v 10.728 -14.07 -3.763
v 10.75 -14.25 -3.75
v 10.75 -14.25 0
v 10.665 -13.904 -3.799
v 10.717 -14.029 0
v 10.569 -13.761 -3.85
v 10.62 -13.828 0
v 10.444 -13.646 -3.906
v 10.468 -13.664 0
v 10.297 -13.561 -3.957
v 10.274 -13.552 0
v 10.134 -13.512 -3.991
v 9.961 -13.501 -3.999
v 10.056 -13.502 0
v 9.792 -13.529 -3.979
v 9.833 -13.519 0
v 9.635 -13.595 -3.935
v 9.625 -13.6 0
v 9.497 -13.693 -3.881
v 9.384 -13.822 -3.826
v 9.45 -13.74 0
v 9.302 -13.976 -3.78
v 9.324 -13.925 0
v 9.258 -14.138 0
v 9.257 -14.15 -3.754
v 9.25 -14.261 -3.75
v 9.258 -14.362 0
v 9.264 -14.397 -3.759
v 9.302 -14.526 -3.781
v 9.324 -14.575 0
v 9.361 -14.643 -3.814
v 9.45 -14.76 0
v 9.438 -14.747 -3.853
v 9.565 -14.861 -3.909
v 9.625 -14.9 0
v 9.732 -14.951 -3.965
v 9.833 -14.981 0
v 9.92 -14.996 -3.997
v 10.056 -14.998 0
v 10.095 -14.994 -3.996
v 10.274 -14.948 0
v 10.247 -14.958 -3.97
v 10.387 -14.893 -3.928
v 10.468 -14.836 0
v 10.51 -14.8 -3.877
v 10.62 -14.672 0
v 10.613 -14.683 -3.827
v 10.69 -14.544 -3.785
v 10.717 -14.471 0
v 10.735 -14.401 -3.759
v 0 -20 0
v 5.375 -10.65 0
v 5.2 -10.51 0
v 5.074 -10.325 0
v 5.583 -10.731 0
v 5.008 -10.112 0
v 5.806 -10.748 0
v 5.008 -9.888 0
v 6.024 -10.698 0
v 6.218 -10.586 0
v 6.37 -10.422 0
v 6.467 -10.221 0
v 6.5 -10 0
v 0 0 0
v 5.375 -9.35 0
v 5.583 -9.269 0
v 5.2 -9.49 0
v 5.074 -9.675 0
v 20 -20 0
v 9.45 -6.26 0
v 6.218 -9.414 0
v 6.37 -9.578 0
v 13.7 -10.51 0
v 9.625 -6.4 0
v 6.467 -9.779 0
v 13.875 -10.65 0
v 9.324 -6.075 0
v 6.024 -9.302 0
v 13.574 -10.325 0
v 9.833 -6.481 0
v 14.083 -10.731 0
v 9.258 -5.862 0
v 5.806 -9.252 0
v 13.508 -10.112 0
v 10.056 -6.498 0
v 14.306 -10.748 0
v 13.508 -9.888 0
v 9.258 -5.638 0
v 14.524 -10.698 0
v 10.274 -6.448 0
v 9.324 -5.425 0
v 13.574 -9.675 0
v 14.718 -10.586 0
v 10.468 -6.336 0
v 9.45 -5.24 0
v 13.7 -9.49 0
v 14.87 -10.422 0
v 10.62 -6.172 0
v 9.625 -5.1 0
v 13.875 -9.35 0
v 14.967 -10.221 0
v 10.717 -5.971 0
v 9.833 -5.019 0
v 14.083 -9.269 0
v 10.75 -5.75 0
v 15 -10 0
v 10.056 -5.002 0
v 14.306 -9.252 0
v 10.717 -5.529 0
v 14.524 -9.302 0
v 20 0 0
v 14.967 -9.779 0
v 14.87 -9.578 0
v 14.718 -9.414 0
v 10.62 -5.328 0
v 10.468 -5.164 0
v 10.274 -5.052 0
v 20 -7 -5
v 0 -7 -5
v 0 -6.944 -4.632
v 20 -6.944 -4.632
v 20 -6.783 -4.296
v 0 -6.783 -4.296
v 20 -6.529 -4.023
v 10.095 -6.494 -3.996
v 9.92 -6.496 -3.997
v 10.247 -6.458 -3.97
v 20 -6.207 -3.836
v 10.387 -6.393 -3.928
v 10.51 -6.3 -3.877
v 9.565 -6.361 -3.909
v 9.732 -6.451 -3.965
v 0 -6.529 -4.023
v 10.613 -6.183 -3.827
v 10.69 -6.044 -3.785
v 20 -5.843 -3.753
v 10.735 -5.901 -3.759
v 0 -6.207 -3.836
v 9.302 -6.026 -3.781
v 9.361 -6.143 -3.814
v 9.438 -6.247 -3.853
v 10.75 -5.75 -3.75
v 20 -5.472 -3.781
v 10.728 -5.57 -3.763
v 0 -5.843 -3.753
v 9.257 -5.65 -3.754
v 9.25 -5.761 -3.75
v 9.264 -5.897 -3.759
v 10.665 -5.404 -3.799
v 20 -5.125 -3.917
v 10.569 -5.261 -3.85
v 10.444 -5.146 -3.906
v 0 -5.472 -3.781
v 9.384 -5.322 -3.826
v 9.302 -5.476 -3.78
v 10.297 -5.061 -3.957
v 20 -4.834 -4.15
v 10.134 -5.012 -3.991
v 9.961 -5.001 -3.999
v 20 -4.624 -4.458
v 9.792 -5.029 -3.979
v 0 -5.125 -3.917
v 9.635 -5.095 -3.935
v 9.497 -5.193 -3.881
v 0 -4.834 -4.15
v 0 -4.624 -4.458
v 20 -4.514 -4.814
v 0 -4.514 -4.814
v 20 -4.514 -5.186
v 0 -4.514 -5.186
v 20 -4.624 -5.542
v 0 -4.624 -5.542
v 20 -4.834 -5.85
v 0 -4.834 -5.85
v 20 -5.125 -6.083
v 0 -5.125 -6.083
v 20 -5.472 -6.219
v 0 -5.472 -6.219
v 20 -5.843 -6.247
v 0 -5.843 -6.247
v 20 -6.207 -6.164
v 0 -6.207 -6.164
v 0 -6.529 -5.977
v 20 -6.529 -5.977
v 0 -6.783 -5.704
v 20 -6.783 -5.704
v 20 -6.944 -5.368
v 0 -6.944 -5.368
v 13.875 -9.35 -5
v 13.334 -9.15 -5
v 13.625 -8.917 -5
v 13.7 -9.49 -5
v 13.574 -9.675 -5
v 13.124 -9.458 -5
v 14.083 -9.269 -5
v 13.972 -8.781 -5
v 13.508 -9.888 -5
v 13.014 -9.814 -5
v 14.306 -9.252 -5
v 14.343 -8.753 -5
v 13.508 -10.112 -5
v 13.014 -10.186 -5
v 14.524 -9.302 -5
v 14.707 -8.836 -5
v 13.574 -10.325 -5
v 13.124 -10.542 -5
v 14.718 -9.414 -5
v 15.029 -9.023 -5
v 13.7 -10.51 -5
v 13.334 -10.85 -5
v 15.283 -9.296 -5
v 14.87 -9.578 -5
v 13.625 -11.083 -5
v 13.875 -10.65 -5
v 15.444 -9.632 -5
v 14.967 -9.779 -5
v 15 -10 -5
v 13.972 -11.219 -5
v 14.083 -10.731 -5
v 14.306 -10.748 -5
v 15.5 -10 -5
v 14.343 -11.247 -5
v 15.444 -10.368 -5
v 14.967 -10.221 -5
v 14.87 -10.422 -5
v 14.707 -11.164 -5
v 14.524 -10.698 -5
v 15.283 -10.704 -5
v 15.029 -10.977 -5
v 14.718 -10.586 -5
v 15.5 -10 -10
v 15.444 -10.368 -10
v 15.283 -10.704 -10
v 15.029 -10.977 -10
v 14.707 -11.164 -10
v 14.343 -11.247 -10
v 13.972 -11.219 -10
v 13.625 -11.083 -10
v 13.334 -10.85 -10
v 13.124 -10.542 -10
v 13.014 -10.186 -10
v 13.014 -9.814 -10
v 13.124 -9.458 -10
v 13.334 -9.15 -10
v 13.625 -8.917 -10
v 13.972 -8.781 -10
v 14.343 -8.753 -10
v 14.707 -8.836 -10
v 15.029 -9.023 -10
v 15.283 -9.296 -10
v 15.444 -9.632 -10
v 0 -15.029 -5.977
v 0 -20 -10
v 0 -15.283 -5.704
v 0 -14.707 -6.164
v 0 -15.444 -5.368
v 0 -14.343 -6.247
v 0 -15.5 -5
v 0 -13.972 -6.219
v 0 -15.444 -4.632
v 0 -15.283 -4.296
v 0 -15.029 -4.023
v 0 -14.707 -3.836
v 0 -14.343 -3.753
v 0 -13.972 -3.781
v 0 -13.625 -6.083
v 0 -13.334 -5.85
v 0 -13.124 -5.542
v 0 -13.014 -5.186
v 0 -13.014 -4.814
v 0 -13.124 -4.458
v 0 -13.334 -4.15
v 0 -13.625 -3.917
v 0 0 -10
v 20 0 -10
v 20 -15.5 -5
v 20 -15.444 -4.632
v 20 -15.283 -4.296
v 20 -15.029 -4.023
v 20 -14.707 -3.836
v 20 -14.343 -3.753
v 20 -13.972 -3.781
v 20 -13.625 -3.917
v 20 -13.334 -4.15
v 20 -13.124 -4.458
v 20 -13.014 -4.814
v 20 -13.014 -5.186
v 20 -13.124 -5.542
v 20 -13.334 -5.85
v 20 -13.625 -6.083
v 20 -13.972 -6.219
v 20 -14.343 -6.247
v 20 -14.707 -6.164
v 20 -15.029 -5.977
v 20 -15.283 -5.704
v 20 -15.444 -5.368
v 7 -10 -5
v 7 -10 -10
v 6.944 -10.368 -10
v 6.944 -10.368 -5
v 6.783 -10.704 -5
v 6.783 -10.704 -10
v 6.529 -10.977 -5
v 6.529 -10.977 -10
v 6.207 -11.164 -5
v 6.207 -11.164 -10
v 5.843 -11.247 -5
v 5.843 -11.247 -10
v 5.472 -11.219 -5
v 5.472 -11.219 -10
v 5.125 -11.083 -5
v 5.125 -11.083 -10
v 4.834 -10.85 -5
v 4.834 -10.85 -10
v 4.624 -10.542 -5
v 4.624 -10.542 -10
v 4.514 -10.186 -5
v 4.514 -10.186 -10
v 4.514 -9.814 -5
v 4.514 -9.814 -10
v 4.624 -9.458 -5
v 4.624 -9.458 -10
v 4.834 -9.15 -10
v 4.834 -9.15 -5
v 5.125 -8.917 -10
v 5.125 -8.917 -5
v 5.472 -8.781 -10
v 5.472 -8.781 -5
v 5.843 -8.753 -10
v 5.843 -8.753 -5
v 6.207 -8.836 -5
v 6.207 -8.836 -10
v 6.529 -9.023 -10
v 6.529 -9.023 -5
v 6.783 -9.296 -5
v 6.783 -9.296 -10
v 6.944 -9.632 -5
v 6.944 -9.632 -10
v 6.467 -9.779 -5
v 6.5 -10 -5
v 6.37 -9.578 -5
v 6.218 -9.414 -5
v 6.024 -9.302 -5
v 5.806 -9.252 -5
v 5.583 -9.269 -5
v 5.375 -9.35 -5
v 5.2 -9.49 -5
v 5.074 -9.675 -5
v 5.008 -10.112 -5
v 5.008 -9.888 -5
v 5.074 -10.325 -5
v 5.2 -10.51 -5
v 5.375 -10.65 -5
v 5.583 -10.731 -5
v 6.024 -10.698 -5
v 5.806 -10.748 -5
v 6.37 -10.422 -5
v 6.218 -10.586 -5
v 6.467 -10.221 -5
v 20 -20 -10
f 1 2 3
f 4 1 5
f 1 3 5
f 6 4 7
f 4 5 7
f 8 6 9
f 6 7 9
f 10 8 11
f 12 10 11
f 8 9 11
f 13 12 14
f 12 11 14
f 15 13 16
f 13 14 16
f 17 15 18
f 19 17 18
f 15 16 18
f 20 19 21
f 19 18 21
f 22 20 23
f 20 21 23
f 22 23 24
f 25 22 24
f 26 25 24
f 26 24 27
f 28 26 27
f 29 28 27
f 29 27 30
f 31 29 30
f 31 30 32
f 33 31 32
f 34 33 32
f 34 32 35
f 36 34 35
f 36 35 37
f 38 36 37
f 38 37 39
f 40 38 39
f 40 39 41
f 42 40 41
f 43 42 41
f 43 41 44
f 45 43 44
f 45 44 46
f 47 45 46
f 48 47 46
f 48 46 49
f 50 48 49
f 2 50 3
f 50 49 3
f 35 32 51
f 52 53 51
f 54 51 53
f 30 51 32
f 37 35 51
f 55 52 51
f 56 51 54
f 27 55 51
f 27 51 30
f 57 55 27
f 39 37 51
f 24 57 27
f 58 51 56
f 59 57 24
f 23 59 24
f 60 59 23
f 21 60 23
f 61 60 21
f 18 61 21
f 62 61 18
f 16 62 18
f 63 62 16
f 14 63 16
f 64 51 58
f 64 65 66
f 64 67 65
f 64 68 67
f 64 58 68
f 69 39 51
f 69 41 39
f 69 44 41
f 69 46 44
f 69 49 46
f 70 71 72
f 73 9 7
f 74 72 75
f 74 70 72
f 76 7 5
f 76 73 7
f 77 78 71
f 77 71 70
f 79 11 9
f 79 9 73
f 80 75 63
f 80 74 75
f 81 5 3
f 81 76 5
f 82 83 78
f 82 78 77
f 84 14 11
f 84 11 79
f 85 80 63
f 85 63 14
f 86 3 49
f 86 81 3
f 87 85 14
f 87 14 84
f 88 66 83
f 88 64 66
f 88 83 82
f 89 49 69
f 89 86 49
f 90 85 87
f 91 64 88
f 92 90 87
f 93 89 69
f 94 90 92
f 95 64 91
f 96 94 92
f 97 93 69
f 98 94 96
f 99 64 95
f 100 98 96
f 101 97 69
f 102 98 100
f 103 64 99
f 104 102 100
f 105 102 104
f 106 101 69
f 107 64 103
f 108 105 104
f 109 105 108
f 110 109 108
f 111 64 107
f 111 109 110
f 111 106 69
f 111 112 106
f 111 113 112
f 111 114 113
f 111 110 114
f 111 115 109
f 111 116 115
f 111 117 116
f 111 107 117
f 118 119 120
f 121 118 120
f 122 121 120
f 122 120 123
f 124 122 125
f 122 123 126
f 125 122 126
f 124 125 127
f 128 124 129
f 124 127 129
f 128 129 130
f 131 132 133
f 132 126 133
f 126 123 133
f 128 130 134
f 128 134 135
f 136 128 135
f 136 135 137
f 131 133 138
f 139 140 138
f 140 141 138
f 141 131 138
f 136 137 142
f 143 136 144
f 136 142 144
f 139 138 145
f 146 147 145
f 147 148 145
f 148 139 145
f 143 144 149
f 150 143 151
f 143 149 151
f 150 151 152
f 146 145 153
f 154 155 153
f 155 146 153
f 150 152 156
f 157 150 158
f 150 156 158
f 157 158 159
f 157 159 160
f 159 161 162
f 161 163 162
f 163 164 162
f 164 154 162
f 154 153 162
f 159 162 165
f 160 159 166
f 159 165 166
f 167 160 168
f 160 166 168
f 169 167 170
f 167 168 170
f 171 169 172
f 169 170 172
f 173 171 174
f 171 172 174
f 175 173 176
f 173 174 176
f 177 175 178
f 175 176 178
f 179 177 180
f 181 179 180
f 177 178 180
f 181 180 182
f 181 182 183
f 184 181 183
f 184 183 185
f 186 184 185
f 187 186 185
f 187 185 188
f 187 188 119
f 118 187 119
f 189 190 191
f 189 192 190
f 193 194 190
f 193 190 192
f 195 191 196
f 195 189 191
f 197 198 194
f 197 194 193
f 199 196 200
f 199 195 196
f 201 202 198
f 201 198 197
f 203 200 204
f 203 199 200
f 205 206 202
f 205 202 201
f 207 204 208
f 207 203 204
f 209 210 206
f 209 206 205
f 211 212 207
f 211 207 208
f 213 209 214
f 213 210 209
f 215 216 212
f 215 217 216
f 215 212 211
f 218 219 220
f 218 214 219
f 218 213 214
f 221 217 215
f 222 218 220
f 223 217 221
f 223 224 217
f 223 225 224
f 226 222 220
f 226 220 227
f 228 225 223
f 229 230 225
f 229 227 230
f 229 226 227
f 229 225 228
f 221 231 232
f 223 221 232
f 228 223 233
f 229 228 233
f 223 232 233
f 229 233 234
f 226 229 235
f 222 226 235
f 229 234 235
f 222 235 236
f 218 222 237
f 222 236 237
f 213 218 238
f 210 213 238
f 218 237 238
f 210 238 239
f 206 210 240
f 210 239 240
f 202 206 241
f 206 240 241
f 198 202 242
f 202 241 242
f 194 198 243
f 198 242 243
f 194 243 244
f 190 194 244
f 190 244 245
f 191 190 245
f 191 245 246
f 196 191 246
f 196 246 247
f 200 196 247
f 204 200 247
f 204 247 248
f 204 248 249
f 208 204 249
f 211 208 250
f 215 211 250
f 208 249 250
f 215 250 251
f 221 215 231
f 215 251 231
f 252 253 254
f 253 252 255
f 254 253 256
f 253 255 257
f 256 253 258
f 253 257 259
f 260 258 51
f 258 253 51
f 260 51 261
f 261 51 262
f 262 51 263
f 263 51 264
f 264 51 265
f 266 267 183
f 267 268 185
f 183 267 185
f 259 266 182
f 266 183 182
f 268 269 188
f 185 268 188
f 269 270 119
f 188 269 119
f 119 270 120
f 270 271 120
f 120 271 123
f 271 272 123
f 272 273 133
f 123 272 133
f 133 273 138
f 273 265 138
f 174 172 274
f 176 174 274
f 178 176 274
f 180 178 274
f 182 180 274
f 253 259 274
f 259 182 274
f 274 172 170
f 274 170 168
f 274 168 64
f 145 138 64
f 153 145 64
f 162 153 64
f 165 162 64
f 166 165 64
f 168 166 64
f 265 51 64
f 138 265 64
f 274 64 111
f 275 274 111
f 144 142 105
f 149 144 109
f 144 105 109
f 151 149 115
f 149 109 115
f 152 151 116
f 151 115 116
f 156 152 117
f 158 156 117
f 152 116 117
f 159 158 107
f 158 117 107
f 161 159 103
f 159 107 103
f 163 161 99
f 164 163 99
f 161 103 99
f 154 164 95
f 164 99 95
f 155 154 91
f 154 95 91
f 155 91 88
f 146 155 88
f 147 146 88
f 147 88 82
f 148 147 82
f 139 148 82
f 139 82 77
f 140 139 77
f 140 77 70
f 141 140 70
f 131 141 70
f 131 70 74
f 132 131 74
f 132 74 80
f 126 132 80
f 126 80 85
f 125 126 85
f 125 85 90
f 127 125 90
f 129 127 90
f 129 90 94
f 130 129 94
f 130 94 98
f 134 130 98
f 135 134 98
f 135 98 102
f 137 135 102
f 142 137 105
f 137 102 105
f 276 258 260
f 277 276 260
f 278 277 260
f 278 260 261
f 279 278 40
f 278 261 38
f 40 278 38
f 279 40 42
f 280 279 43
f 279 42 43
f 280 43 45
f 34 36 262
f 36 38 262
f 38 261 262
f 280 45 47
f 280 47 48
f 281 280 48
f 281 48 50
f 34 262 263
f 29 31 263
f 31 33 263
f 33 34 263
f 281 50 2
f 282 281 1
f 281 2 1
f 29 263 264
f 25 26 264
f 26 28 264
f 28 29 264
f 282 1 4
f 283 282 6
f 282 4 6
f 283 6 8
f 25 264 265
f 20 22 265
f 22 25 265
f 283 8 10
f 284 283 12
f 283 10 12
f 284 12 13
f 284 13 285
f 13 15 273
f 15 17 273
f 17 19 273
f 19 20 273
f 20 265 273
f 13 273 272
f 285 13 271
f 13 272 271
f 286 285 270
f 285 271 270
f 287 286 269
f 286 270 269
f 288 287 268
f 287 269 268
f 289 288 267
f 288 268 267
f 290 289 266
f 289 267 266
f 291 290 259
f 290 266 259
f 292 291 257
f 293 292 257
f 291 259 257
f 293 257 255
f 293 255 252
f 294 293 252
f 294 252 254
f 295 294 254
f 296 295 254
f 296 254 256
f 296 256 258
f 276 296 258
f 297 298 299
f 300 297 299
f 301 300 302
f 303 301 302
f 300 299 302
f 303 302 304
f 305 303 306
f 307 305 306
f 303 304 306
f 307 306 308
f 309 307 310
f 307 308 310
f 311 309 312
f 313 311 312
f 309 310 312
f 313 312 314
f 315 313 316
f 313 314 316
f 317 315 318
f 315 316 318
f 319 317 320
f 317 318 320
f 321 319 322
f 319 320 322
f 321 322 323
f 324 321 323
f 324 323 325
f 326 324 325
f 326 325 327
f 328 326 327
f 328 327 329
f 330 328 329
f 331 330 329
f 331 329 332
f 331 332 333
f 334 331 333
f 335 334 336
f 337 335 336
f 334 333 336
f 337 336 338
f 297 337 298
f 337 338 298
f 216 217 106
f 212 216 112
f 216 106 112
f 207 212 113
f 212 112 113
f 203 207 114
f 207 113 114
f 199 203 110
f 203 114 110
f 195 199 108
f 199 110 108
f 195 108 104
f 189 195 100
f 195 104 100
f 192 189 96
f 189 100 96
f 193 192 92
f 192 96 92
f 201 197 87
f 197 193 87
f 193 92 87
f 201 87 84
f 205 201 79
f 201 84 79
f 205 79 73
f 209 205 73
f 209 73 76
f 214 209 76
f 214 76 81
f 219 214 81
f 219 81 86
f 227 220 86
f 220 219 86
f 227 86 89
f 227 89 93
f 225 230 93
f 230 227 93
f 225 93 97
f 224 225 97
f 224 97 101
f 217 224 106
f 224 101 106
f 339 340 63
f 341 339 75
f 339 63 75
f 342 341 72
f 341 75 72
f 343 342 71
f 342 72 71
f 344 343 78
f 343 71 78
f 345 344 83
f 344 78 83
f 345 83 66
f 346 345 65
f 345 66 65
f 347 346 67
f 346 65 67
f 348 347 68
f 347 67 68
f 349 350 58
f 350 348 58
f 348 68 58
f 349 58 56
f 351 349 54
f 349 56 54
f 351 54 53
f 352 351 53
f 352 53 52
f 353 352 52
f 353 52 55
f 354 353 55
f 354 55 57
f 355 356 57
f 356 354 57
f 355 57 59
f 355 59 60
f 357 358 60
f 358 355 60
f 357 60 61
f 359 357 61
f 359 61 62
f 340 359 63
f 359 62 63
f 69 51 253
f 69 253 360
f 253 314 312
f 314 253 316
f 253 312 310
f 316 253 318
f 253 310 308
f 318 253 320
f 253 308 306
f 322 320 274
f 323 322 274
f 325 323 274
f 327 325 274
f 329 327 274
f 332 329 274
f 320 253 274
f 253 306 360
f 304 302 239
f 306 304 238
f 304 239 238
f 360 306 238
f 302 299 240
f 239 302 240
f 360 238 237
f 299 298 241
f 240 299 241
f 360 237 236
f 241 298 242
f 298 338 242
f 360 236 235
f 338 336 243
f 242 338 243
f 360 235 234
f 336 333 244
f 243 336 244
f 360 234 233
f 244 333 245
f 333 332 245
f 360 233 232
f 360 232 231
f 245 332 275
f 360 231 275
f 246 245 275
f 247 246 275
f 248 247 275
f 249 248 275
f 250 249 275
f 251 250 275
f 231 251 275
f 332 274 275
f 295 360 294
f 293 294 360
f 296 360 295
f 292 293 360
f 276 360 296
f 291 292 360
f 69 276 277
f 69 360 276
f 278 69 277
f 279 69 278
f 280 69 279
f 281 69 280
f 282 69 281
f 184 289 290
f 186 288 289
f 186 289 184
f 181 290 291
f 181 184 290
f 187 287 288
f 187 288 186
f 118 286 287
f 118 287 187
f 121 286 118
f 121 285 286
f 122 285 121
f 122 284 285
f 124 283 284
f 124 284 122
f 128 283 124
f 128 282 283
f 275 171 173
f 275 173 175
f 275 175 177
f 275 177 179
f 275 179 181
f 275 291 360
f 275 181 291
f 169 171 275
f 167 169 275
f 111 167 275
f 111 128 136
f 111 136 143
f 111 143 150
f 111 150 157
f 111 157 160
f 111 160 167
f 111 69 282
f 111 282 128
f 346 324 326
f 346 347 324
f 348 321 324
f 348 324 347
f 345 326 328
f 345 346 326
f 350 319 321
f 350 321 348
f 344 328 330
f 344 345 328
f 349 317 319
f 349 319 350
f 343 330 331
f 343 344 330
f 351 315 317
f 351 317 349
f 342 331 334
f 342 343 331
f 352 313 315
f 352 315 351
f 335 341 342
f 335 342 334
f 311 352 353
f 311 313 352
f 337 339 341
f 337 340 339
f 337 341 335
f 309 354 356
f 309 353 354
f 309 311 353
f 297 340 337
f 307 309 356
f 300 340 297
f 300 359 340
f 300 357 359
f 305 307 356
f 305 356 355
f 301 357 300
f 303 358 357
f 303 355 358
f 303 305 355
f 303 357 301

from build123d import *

# Parameters (mm, degrees)
F0_W     = 20
F0_H     = 20
F0_R     = 8
F0_R_2   = 7
F0_R_3   = 0.75
F1_DEPTH = 10
F2_R     = 1.25
F3_DEPTH = 25
F4_DEPTH = 6
F5_R     = 1.25
F5_R_2   = 0.75
F6_DEPTH = 5


with BuildPart() as f1:
    # F0 (on Top) → F1 (new body)
    with BuildSketch(Plane.XY):
        with Locations((10, -10)):
            Rectangle(F0_W, F0_H)
        with Locations((10, -10)):
            Circle(F0_R, mode=Mode.SUBTRACT)
        with Locations((10, -10)):
            Circle(F0_R)
        with Locations((10, -10)):
            Circle(F0_R_2, mode=Mode.SUBTRACT)
        with Locations((10, -10)):
            Circle(F0_R_2)
        with Locations((10, -14.25)):
            Circle(F0_R_3, mode=Mode.SUBTRACT)
        with Locations((5.75, -10)):
            Circle(F0_R_3, mode=Mode.SUBTRACT)
        with Locations((14.25, -10)):
            Circle(F0_R_3, mode=Mode.SUBTRACT)
        with Locations((10, -5.75)):
            Circle(F0_R_3, mode=Mode.SUBTRACT)
        with Locations((10, -14.25)):
            Circle(F0_R_3)
        with Locations((10, -5.75)):
            Circle(F0_R_3)
    extrude(amount=-F1_DEPTH)

    # F2 (on face) → F3 (cut)
    with BuildSketch(Plane(origin=(0, 0, 0), x_dir=(0, -1, 0), z_dir=(-1, 0, 0))):
        with Locations((5.75, -5)):
            Circle(F2_R)
        with Locations((14.25, -5)):
            Circle(F2_R)
    extrude(amount=-F3_DEPTH, mode=Mode.SUBTRACT)

    # F0 (on Top) → F4 (cut)
    with BuildSketch(Plane.XY):
        with Locations((10, -5.75)):
            Circle(F0_R_3)
        with Locations((10, -14.25)):
            Circle(F0_R_3)
    extrude(amount=-F4_DEPTH, mode=Mode.SUBTRACT)

    # F5 (on face) → F6 (cut)
    with BuildSketch(Plane(origin=(0, 0, -10), x_dir=(1, 0, 0), z_dir=(0, 0, -1))):
        with Locations((5.75, 10)):
            Circle(F5_R)
        with Locations((5.75, 10)):
            Circle(F5_R_2, mode=Mode.SUBTRACT)
        with Locations((14.25, 10)):
            Circle(F5_R)
        with Locations((14.25, 10)):
            Circle(F5_R_2, mode=Mode.SUBTRACT)
    extrude(amount=-F6_DEPTH, mode=Mode.SUBTRACT)


solid = f1.part
